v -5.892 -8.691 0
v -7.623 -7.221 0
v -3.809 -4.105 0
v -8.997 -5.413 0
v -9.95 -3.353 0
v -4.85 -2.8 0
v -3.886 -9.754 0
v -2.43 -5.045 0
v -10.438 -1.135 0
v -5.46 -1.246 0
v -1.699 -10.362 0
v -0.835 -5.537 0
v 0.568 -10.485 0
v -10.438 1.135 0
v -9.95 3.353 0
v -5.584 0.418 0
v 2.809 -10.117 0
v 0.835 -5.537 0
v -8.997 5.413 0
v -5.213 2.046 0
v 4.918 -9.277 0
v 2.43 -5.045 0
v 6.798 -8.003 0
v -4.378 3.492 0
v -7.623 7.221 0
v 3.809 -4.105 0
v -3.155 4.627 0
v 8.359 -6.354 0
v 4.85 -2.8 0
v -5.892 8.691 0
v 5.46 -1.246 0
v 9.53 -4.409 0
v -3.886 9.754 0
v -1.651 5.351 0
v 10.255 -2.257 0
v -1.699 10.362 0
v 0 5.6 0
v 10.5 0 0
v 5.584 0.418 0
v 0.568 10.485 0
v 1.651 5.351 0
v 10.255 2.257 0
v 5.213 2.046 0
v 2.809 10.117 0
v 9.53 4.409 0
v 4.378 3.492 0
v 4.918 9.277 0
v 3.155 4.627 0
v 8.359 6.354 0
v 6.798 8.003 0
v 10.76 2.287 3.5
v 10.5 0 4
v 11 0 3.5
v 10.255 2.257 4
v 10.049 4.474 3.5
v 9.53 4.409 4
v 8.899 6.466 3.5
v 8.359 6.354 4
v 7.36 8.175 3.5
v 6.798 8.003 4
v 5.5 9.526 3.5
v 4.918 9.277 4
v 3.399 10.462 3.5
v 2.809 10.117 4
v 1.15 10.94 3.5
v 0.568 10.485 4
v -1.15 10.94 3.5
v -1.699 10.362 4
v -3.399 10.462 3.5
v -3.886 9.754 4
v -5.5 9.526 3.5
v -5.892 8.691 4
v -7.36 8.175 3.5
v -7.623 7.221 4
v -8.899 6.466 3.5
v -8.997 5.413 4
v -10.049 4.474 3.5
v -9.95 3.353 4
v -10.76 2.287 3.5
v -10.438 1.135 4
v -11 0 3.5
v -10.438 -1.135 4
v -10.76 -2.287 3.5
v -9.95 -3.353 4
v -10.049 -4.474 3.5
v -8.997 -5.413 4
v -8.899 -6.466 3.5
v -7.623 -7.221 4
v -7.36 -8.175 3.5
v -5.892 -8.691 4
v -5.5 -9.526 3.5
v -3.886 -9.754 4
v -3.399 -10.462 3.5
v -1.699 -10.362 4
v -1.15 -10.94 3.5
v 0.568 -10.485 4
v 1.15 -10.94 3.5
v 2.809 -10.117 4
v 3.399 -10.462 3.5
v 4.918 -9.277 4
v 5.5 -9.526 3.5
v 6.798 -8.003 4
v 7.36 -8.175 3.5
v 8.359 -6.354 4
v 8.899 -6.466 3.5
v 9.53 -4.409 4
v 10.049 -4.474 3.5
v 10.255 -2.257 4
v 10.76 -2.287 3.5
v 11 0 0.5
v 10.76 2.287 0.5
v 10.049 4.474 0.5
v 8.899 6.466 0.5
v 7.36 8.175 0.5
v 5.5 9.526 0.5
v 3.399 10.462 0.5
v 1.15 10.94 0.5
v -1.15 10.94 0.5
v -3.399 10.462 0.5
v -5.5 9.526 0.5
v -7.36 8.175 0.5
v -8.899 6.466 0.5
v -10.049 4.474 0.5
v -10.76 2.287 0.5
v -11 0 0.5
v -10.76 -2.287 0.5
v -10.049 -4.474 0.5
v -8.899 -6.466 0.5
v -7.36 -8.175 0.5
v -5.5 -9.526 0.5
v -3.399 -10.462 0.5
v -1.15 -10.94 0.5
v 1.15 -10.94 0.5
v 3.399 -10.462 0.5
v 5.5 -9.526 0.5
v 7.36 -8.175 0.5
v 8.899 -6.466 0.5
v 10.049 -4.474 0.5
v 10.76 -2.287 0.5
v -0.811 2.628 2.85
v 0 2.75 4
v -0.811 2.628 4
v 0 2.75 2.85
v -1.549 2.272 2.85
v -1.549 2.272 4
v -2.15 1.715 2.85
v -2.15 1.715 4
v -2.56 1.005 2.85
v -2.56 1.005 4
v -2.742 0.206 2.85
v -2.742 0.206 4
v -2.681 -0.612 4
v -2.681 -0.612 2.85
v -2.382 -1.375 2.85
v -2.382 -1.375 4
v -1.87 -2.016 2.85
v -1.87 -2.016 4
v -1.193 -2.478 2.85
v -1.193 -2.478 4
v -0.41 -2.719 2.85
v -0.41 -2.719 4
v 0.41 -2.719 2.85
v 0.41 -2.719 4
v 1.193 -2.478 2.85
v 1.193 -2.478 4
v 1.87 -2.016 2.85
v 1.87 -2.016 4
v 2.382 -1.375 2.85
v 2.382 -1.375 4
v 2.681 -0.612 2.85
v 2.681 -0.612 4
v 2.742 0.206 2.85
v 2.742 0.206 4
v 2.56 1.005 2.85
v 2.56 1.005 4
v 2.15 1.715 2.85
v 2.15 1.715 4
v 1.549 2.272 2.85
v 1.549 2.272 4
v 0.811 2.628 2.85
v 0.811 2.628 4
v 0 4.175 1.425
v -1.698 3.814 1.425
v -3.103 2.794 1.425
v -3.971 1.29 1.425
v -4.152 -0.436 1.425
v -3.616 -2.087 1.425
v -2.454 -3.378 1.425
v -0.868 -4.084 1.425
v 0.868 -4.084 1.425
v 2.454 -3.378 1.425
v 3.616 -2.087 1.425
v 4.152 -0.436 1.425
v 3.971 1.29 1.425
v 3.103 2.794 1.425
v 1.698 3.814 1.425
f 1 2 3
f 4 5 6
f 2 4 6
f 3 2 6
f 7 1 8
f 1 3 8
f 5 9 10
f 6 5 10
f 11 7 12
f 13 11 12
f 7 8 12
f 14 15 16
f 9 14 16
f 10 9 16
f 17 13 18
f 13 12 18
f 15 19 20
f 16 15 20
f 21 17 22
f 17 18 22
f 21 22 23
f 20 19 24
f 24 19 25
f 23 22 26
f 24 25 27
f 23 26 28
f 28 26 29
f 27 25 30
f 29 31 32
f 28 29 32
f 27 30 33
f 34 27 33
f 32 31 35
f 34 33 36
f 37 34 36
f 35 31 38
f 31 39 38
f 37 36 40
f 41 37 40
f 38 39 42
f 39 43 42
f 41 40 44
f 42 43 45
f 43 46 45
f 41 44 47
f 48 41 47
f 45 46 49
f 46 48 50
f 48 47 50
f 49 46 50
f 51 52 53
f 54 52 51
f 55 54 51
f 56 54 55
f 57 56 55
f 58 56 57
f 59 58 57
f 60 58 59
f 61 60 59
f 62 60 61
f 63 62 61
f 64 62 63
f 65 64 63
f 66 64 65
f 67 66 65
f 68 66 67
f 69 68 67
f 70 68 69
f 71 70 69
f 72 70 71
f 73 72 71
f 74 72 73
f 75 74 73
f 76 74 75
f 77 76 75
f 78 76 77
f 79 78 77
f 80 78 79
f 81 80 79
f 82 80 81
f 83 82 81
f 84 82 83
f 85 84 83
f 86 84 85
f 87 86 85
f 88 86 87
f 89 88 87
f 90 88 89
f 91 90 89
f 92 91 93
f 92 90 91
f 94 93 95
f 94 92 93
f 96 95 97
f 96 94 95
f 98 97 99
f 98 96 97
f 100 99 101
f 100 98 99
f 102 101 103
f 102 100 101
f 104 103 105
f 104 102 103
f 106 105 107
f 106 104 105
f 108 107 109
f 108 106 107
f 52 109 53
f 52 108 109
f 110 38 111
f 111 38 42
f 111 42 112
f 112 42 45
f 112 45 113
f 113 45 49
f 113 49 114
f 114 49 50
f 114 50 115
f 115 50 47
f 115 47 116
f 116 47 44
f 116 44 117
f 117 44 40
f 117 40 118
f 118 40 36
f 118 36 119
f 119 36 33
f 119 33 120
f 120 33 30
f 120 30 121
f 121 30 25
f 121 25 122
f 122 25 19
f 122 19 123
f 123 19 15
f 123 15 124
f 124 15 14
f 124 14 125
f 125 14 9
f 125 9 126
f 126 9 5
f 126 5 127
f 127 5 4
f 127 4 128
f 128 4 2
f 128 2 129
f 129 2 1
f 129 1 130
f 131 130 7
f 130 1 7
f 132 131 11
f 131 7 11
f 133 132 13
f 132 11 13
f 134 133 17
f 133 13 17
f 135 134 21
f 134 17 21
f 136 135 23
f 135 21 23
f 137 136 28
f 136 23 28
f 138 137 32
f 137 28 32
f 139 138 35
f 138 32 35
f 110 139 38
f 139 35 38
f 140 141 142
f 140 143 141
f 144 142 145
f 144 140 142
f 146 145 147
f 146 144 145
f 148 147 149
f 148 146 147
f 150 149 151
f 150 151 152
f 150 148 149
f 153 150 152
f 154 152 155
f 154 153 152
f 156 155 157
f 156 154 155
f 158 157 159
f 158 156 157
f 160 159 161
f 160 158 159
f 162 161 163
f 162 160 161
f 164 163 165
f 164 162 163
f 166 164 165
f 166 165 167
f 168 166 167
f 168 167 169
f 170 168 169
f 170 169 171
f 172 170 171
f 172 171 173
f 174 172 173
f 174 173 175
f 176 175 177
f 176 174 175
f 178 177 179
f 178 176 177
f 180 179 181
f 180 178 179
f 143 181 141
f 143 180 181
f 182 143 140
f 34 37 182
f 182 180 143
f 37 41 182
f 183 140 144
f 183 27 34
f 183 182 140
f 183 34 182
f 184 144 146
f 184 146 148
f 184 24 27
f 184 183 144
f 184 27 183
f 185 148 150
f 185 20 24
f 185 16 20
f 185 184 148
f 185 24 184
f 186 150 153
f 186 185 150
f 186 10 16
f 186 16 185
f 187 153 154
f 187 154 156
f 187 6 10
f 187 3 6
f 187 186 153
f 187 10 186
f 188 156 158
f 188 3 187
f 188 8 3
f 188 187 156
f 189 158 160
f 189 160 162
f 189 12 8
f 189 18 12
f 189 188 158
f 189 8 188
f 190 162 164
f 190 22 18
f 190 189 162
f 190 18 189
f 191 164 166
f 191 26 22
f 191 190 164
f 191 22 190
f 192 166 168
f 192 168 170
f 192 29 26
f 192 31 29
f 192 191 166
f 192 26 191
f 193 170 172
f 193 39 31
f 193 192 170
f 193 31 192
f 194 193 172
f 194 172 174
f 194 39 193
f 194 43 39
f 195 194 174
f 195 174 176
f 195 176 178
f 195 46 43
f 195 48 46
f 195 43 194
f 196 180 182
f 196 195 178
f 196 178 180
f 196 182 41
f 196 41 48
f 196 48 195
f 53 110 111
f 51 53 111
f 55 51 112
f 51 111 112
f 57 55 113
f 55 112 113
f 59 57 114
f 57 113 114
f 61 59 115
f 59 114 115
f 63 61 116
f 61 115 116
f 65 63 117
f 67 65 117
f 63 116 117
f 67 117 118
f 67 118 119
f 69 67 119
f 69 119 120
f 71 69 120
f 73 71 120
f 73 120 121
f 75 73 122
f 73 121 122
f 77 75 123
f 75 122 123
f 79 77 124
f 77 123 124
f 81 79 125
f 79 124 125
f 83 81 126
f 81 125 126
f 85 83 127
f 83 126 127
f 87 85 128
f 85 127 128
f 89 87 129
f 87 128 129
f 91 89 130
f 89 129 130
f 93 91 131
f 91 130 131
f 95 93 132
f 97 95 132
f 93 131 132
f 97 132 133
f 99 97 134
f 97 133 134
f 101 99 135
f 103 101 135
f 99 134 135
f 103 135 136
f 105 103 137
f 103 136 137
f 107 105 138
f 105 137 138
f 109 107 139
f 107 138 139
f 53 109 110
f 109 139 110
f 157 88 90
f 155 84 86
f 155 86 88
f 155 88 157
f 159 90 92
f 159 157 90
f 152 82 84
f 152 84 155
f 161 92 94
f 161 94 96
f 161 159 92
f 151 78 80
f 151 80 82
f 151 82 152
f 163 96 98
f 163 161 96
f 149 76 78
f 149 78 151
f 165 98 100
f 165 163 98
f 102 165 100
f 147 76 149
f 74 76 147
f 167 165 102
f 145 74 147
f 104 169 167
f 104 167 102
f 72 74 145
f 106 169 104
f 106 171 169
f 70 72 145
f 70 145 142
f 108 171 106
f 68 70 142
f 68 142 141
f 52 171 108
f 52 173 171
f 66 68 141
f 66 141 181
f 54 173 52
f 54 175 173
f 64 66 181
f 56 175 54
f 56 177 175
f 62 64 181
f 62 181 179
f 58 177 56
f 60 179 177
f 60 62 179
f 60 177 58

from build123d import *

# Parameters (mm, degrees)
SKETCH_1_R      = 11
EXTRUDE_1_DEPTH = 4
CHAMFER_1_SIZE  = 0.5


with BuildPart() as part:
    # 草图1 → 拉伸1 (new body)
    with BuildSketch(Plane.XY):
        Circle(SKETCH_1_R)
    extrude(amount=EXTRUDE_1_DEPTH)

    # 倒角1
    chamfer_1_edges = [part.edges().sort_by_distance(p)[0] for p in [
        (-11, 0, 0),
        (-11, 0, 4),
    ]]
    chamfer(chamfer_1_edges, length=CHAMFER_1_SIZE)

    # 草图2 → 打孔尺寸根据十字槽沉头木螺钉的类型1 (revolve, cut)
    with BuildSketch(Plane.YZ):
        Polygon((0, 0), (0, 4), (2.75, 4), (2.75, 2.85), (5.6, 0), align=None)
    revolve(axis=Axis((0, 0, -6.35), (0, 0, 1)), mode=Mode.SUBTRACT)


solid = part.part
